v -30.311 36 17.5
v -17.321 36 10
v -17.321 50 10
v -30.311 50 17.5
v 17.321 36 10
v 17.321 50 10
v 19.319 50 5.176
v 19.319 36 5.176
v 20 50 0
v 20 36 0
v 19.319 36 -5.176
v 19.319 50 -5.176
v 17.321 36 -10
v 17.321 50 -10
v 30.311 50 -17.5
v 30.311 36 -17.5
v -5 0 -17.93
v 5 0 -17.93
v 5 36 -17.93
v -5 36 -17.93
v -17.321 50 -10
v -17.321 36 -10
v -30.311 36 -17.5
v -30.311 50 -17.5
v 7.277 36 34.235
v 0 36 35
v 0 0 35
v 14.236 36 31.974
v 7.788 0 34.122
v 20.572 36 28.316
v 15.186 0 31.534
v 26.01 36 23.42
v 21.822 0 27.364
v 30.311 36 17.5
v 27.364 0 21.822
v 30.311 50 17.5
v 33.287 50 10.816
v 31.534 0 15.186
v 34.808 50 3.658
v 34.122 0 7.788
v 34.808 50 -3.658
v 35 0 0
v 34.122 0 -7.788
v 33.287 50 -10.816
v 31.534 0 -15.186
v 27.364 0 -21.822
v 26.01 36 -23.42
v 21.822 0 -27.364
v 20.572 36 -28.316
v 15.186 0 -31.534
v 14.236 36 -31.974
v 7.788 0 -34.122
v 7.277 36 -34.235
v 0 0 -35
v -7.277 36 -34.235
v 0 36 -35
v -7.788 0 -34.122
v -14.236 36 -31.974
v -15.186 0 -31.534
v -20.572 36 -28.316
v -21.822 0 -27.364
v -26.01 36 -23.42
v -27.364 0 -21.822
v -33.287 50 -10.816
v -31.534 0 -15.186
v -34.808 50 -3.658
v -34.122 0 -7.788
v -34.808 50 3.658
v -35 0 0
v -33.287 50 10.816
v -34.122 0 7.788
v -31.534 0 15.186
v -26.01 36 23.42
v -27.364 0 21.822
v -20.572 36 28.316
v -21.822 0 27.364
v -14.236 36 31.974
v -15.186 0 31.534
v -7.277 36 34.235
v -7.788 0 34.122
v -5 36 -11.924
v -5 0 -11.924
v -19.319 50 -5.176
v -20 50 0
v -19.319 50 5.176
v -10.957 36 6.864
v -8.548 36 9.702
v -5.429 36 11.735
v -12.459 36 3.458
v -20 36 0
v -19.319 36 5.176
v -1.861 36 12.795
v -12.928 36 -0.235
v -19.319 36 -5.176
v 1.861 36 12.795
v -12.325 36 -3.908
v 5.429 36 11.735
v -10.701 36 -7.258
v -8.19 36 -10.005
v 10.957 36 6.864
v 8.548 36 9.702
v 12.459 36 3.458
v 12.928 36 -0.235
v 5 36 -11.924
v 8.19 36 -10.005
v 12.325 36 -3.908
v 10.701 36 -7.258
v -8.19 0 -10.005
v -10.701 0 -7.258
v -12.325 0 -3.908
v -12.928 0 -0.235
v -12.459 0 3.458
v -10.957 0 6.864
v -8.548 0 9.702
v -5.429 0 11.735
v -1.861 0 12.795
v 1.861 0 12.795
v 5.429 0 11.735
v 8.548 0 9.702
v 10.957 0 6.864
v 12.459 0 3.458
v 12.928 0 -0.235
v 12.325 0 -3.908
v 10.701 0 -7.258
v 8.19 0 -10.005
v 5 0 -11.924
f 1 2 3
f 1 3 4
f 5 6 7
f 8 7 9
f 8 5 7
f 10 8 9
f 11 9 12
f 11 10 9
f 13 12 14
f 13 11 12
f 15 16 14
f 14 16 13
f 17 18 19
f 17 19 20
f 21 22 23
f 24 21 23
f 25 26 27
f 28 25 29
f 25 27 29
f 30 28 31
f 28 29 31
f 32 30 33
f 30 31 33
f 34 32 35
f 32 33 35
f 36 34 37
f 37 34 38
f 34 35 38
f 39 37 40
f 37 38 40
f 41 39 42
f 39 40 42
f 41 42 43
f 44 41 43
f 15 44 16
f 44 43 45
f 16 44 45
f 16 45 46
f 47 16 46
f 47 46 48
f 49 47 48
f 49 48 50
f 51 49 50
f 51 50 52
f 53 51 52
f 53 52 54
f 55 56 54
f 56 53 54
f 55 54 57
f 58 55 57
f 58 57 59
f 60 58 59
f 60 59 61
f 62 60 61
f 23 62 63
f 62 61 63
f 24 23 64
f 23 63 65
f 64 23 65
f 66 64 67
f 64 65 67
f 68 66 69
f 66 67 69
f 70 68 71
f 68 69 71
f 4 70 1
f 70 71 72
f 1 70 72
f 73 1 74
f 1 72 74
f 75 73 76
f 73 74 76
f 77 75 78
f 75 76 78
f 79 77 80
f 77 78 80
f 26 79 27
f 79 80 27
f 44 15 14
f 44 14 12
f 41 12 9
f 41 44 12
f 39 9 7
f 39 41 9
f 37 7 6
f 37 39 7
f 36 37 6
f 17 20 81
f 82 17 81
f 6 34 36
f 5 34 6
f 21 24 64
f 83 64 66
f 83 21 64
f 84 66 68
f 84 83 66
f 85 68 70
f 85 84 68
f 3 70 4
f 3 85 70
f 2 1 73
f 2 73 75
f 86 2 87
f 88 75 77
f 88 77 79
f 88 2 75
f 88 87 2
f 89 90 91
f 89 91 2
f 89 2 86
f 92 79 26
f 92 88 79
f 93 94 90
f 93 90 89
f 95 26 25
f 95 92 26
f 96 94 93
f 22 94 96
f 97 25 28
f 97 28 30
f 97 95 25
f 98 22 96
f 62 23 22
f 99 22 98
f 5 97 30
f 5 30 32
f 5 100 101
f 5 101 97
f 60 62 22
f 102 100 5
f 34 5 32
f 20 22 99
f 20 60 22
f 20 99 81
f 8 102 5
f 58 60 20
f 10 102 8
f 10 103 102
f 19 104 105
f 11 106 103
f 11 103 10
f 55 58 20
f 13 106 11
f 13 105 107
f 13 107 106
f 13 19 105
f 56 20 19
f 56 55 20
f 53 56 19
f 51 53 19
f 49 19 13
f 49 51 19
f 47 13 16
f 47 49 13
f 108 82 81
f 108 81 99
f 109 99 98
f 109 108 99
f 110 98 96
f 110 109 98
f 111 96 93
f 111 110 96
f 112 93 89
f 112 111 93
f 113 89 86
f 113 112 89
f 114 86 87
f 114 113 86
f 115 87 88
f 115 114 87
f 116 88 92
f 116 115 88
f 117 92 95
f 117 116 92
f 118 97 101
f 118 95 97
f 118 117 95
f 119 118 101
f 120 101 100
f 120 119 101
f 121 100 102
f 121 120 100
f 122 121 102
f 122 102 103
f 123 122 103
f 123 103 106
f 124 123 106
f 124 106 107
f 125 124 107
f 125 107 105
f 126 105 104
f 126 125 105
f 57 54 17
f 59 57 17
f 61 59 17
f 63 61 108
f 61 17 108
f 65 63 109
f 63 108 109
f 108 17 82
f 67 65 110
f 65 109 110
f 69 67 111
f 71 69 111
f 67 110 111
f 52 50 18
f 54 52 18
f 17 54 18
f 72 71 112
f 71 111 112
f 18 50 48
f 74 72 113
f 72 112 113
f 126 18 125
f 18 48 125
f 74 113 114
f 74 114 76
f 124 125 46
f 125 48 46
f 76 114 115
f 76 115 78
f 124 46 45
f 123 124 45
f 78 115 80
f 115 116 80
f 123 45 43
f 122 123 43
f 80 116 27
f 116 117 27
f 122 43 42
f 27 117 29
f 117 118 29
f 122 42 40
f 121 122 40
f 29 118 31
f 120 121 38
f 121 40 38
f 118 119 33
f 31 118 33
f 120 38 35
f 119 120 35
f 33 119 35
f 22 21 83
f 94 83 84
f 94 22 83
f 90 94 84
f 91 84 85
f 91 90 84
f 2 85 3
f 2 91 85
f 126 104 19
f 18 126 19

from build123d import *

# Parameters (mm, degrees)
SKETCH1_R           = 35
BOSS_EXTRUDE1_DEPTH = 50
CUT_EXTRUDE1_START  = -14
CUT_EXTRUDE1_DEPTH  = 14
CUT_EXTRUDE2_DEPTH  = 71.356236397
CUT_EXTRUDE8_START  = 36
SKETCH10_R          = 20
CUT_EXTRUDE8_DEPTH  = 35.356236397


with BuildPart() as part:
    # Sketch1 → Boss-Extrude1 (new body)
    with BuildSketch(Plane(origin=(0, 0, 0), x_dir=(1, 0, 0), z_dir=(0, 1, 0))):
        with Locations(Location((0, 0, 0), (0, 0, 270))):
            Circle(SKETCH1_R)
    extrude(amount=BOSS_EXTRUDE1_DEPTH)

    # Sketch2 → Cut-Extrude1 (cut)
    with BuildSketch(Plane(origin=(0, 50, 0), x_dir=(1, 0, 0), z_dir=(0, 1, 0)).offset(CUT_EXTRUDE1_START)):
        with BuildLine():
            Line((-10.392304845, -6), (-30.310889132, -17.5))
            ThreePointArc((-30.310889132, -17.5), (0, -35), (30.310889132, -17.5))
            Line((30.310889132, -17.5), (10.392304845, -6))
            ThreePointArc((10.392304845, -6), (0, -12), (-10.392304845, -6))
        make_face()
    cut_extrude1 = extrude(amount=CUT_EXTRUDE1_DEPTH, mode=Mode.SUBTRACT)

    # Mirror2: Cut-Extrude1 across plane
    add(cut_extrude1.mirror(Plane.XY), mode=Mode.SUBTRACT)

    # Sketch3 → Cut-Extrude2 (cut, through all)
    with BuildSketch(Plane(origin=(0, 0, 0), x_dir=(1, 0, 0), z_dir=(0, 1, 0))):
        with BuildLine():
            Line((5, 11.924130996), (5, 17.93))
            Line((5, 17.93), (-5, 17.93))
            Line((-5, 17.93), (-5, 11.924130996))
            ThreePointArc((-5, 11.924130996), (0, -12.93), (5, 11.924130996))
        make_face()
    extrude(amount=CUT_EXTRUDE2_DEPTH, mode=Mode.SUBTRACT)

    # Sketch10 → Cut-Extrude8 (cut, through all)
    with BuildSketch(Plane(origin=(0, 0, 0), x_dir=(1, 0, 0), z_dir=(0, 1, 0)).offset(CUT_EXTRUDE8_START)):
        Circle(SKETCH10_R)
    extrude(amount=CUT_EXTRUDE8_DEPTH, mode=Mode.SUBTRACT)


solid = part.part
